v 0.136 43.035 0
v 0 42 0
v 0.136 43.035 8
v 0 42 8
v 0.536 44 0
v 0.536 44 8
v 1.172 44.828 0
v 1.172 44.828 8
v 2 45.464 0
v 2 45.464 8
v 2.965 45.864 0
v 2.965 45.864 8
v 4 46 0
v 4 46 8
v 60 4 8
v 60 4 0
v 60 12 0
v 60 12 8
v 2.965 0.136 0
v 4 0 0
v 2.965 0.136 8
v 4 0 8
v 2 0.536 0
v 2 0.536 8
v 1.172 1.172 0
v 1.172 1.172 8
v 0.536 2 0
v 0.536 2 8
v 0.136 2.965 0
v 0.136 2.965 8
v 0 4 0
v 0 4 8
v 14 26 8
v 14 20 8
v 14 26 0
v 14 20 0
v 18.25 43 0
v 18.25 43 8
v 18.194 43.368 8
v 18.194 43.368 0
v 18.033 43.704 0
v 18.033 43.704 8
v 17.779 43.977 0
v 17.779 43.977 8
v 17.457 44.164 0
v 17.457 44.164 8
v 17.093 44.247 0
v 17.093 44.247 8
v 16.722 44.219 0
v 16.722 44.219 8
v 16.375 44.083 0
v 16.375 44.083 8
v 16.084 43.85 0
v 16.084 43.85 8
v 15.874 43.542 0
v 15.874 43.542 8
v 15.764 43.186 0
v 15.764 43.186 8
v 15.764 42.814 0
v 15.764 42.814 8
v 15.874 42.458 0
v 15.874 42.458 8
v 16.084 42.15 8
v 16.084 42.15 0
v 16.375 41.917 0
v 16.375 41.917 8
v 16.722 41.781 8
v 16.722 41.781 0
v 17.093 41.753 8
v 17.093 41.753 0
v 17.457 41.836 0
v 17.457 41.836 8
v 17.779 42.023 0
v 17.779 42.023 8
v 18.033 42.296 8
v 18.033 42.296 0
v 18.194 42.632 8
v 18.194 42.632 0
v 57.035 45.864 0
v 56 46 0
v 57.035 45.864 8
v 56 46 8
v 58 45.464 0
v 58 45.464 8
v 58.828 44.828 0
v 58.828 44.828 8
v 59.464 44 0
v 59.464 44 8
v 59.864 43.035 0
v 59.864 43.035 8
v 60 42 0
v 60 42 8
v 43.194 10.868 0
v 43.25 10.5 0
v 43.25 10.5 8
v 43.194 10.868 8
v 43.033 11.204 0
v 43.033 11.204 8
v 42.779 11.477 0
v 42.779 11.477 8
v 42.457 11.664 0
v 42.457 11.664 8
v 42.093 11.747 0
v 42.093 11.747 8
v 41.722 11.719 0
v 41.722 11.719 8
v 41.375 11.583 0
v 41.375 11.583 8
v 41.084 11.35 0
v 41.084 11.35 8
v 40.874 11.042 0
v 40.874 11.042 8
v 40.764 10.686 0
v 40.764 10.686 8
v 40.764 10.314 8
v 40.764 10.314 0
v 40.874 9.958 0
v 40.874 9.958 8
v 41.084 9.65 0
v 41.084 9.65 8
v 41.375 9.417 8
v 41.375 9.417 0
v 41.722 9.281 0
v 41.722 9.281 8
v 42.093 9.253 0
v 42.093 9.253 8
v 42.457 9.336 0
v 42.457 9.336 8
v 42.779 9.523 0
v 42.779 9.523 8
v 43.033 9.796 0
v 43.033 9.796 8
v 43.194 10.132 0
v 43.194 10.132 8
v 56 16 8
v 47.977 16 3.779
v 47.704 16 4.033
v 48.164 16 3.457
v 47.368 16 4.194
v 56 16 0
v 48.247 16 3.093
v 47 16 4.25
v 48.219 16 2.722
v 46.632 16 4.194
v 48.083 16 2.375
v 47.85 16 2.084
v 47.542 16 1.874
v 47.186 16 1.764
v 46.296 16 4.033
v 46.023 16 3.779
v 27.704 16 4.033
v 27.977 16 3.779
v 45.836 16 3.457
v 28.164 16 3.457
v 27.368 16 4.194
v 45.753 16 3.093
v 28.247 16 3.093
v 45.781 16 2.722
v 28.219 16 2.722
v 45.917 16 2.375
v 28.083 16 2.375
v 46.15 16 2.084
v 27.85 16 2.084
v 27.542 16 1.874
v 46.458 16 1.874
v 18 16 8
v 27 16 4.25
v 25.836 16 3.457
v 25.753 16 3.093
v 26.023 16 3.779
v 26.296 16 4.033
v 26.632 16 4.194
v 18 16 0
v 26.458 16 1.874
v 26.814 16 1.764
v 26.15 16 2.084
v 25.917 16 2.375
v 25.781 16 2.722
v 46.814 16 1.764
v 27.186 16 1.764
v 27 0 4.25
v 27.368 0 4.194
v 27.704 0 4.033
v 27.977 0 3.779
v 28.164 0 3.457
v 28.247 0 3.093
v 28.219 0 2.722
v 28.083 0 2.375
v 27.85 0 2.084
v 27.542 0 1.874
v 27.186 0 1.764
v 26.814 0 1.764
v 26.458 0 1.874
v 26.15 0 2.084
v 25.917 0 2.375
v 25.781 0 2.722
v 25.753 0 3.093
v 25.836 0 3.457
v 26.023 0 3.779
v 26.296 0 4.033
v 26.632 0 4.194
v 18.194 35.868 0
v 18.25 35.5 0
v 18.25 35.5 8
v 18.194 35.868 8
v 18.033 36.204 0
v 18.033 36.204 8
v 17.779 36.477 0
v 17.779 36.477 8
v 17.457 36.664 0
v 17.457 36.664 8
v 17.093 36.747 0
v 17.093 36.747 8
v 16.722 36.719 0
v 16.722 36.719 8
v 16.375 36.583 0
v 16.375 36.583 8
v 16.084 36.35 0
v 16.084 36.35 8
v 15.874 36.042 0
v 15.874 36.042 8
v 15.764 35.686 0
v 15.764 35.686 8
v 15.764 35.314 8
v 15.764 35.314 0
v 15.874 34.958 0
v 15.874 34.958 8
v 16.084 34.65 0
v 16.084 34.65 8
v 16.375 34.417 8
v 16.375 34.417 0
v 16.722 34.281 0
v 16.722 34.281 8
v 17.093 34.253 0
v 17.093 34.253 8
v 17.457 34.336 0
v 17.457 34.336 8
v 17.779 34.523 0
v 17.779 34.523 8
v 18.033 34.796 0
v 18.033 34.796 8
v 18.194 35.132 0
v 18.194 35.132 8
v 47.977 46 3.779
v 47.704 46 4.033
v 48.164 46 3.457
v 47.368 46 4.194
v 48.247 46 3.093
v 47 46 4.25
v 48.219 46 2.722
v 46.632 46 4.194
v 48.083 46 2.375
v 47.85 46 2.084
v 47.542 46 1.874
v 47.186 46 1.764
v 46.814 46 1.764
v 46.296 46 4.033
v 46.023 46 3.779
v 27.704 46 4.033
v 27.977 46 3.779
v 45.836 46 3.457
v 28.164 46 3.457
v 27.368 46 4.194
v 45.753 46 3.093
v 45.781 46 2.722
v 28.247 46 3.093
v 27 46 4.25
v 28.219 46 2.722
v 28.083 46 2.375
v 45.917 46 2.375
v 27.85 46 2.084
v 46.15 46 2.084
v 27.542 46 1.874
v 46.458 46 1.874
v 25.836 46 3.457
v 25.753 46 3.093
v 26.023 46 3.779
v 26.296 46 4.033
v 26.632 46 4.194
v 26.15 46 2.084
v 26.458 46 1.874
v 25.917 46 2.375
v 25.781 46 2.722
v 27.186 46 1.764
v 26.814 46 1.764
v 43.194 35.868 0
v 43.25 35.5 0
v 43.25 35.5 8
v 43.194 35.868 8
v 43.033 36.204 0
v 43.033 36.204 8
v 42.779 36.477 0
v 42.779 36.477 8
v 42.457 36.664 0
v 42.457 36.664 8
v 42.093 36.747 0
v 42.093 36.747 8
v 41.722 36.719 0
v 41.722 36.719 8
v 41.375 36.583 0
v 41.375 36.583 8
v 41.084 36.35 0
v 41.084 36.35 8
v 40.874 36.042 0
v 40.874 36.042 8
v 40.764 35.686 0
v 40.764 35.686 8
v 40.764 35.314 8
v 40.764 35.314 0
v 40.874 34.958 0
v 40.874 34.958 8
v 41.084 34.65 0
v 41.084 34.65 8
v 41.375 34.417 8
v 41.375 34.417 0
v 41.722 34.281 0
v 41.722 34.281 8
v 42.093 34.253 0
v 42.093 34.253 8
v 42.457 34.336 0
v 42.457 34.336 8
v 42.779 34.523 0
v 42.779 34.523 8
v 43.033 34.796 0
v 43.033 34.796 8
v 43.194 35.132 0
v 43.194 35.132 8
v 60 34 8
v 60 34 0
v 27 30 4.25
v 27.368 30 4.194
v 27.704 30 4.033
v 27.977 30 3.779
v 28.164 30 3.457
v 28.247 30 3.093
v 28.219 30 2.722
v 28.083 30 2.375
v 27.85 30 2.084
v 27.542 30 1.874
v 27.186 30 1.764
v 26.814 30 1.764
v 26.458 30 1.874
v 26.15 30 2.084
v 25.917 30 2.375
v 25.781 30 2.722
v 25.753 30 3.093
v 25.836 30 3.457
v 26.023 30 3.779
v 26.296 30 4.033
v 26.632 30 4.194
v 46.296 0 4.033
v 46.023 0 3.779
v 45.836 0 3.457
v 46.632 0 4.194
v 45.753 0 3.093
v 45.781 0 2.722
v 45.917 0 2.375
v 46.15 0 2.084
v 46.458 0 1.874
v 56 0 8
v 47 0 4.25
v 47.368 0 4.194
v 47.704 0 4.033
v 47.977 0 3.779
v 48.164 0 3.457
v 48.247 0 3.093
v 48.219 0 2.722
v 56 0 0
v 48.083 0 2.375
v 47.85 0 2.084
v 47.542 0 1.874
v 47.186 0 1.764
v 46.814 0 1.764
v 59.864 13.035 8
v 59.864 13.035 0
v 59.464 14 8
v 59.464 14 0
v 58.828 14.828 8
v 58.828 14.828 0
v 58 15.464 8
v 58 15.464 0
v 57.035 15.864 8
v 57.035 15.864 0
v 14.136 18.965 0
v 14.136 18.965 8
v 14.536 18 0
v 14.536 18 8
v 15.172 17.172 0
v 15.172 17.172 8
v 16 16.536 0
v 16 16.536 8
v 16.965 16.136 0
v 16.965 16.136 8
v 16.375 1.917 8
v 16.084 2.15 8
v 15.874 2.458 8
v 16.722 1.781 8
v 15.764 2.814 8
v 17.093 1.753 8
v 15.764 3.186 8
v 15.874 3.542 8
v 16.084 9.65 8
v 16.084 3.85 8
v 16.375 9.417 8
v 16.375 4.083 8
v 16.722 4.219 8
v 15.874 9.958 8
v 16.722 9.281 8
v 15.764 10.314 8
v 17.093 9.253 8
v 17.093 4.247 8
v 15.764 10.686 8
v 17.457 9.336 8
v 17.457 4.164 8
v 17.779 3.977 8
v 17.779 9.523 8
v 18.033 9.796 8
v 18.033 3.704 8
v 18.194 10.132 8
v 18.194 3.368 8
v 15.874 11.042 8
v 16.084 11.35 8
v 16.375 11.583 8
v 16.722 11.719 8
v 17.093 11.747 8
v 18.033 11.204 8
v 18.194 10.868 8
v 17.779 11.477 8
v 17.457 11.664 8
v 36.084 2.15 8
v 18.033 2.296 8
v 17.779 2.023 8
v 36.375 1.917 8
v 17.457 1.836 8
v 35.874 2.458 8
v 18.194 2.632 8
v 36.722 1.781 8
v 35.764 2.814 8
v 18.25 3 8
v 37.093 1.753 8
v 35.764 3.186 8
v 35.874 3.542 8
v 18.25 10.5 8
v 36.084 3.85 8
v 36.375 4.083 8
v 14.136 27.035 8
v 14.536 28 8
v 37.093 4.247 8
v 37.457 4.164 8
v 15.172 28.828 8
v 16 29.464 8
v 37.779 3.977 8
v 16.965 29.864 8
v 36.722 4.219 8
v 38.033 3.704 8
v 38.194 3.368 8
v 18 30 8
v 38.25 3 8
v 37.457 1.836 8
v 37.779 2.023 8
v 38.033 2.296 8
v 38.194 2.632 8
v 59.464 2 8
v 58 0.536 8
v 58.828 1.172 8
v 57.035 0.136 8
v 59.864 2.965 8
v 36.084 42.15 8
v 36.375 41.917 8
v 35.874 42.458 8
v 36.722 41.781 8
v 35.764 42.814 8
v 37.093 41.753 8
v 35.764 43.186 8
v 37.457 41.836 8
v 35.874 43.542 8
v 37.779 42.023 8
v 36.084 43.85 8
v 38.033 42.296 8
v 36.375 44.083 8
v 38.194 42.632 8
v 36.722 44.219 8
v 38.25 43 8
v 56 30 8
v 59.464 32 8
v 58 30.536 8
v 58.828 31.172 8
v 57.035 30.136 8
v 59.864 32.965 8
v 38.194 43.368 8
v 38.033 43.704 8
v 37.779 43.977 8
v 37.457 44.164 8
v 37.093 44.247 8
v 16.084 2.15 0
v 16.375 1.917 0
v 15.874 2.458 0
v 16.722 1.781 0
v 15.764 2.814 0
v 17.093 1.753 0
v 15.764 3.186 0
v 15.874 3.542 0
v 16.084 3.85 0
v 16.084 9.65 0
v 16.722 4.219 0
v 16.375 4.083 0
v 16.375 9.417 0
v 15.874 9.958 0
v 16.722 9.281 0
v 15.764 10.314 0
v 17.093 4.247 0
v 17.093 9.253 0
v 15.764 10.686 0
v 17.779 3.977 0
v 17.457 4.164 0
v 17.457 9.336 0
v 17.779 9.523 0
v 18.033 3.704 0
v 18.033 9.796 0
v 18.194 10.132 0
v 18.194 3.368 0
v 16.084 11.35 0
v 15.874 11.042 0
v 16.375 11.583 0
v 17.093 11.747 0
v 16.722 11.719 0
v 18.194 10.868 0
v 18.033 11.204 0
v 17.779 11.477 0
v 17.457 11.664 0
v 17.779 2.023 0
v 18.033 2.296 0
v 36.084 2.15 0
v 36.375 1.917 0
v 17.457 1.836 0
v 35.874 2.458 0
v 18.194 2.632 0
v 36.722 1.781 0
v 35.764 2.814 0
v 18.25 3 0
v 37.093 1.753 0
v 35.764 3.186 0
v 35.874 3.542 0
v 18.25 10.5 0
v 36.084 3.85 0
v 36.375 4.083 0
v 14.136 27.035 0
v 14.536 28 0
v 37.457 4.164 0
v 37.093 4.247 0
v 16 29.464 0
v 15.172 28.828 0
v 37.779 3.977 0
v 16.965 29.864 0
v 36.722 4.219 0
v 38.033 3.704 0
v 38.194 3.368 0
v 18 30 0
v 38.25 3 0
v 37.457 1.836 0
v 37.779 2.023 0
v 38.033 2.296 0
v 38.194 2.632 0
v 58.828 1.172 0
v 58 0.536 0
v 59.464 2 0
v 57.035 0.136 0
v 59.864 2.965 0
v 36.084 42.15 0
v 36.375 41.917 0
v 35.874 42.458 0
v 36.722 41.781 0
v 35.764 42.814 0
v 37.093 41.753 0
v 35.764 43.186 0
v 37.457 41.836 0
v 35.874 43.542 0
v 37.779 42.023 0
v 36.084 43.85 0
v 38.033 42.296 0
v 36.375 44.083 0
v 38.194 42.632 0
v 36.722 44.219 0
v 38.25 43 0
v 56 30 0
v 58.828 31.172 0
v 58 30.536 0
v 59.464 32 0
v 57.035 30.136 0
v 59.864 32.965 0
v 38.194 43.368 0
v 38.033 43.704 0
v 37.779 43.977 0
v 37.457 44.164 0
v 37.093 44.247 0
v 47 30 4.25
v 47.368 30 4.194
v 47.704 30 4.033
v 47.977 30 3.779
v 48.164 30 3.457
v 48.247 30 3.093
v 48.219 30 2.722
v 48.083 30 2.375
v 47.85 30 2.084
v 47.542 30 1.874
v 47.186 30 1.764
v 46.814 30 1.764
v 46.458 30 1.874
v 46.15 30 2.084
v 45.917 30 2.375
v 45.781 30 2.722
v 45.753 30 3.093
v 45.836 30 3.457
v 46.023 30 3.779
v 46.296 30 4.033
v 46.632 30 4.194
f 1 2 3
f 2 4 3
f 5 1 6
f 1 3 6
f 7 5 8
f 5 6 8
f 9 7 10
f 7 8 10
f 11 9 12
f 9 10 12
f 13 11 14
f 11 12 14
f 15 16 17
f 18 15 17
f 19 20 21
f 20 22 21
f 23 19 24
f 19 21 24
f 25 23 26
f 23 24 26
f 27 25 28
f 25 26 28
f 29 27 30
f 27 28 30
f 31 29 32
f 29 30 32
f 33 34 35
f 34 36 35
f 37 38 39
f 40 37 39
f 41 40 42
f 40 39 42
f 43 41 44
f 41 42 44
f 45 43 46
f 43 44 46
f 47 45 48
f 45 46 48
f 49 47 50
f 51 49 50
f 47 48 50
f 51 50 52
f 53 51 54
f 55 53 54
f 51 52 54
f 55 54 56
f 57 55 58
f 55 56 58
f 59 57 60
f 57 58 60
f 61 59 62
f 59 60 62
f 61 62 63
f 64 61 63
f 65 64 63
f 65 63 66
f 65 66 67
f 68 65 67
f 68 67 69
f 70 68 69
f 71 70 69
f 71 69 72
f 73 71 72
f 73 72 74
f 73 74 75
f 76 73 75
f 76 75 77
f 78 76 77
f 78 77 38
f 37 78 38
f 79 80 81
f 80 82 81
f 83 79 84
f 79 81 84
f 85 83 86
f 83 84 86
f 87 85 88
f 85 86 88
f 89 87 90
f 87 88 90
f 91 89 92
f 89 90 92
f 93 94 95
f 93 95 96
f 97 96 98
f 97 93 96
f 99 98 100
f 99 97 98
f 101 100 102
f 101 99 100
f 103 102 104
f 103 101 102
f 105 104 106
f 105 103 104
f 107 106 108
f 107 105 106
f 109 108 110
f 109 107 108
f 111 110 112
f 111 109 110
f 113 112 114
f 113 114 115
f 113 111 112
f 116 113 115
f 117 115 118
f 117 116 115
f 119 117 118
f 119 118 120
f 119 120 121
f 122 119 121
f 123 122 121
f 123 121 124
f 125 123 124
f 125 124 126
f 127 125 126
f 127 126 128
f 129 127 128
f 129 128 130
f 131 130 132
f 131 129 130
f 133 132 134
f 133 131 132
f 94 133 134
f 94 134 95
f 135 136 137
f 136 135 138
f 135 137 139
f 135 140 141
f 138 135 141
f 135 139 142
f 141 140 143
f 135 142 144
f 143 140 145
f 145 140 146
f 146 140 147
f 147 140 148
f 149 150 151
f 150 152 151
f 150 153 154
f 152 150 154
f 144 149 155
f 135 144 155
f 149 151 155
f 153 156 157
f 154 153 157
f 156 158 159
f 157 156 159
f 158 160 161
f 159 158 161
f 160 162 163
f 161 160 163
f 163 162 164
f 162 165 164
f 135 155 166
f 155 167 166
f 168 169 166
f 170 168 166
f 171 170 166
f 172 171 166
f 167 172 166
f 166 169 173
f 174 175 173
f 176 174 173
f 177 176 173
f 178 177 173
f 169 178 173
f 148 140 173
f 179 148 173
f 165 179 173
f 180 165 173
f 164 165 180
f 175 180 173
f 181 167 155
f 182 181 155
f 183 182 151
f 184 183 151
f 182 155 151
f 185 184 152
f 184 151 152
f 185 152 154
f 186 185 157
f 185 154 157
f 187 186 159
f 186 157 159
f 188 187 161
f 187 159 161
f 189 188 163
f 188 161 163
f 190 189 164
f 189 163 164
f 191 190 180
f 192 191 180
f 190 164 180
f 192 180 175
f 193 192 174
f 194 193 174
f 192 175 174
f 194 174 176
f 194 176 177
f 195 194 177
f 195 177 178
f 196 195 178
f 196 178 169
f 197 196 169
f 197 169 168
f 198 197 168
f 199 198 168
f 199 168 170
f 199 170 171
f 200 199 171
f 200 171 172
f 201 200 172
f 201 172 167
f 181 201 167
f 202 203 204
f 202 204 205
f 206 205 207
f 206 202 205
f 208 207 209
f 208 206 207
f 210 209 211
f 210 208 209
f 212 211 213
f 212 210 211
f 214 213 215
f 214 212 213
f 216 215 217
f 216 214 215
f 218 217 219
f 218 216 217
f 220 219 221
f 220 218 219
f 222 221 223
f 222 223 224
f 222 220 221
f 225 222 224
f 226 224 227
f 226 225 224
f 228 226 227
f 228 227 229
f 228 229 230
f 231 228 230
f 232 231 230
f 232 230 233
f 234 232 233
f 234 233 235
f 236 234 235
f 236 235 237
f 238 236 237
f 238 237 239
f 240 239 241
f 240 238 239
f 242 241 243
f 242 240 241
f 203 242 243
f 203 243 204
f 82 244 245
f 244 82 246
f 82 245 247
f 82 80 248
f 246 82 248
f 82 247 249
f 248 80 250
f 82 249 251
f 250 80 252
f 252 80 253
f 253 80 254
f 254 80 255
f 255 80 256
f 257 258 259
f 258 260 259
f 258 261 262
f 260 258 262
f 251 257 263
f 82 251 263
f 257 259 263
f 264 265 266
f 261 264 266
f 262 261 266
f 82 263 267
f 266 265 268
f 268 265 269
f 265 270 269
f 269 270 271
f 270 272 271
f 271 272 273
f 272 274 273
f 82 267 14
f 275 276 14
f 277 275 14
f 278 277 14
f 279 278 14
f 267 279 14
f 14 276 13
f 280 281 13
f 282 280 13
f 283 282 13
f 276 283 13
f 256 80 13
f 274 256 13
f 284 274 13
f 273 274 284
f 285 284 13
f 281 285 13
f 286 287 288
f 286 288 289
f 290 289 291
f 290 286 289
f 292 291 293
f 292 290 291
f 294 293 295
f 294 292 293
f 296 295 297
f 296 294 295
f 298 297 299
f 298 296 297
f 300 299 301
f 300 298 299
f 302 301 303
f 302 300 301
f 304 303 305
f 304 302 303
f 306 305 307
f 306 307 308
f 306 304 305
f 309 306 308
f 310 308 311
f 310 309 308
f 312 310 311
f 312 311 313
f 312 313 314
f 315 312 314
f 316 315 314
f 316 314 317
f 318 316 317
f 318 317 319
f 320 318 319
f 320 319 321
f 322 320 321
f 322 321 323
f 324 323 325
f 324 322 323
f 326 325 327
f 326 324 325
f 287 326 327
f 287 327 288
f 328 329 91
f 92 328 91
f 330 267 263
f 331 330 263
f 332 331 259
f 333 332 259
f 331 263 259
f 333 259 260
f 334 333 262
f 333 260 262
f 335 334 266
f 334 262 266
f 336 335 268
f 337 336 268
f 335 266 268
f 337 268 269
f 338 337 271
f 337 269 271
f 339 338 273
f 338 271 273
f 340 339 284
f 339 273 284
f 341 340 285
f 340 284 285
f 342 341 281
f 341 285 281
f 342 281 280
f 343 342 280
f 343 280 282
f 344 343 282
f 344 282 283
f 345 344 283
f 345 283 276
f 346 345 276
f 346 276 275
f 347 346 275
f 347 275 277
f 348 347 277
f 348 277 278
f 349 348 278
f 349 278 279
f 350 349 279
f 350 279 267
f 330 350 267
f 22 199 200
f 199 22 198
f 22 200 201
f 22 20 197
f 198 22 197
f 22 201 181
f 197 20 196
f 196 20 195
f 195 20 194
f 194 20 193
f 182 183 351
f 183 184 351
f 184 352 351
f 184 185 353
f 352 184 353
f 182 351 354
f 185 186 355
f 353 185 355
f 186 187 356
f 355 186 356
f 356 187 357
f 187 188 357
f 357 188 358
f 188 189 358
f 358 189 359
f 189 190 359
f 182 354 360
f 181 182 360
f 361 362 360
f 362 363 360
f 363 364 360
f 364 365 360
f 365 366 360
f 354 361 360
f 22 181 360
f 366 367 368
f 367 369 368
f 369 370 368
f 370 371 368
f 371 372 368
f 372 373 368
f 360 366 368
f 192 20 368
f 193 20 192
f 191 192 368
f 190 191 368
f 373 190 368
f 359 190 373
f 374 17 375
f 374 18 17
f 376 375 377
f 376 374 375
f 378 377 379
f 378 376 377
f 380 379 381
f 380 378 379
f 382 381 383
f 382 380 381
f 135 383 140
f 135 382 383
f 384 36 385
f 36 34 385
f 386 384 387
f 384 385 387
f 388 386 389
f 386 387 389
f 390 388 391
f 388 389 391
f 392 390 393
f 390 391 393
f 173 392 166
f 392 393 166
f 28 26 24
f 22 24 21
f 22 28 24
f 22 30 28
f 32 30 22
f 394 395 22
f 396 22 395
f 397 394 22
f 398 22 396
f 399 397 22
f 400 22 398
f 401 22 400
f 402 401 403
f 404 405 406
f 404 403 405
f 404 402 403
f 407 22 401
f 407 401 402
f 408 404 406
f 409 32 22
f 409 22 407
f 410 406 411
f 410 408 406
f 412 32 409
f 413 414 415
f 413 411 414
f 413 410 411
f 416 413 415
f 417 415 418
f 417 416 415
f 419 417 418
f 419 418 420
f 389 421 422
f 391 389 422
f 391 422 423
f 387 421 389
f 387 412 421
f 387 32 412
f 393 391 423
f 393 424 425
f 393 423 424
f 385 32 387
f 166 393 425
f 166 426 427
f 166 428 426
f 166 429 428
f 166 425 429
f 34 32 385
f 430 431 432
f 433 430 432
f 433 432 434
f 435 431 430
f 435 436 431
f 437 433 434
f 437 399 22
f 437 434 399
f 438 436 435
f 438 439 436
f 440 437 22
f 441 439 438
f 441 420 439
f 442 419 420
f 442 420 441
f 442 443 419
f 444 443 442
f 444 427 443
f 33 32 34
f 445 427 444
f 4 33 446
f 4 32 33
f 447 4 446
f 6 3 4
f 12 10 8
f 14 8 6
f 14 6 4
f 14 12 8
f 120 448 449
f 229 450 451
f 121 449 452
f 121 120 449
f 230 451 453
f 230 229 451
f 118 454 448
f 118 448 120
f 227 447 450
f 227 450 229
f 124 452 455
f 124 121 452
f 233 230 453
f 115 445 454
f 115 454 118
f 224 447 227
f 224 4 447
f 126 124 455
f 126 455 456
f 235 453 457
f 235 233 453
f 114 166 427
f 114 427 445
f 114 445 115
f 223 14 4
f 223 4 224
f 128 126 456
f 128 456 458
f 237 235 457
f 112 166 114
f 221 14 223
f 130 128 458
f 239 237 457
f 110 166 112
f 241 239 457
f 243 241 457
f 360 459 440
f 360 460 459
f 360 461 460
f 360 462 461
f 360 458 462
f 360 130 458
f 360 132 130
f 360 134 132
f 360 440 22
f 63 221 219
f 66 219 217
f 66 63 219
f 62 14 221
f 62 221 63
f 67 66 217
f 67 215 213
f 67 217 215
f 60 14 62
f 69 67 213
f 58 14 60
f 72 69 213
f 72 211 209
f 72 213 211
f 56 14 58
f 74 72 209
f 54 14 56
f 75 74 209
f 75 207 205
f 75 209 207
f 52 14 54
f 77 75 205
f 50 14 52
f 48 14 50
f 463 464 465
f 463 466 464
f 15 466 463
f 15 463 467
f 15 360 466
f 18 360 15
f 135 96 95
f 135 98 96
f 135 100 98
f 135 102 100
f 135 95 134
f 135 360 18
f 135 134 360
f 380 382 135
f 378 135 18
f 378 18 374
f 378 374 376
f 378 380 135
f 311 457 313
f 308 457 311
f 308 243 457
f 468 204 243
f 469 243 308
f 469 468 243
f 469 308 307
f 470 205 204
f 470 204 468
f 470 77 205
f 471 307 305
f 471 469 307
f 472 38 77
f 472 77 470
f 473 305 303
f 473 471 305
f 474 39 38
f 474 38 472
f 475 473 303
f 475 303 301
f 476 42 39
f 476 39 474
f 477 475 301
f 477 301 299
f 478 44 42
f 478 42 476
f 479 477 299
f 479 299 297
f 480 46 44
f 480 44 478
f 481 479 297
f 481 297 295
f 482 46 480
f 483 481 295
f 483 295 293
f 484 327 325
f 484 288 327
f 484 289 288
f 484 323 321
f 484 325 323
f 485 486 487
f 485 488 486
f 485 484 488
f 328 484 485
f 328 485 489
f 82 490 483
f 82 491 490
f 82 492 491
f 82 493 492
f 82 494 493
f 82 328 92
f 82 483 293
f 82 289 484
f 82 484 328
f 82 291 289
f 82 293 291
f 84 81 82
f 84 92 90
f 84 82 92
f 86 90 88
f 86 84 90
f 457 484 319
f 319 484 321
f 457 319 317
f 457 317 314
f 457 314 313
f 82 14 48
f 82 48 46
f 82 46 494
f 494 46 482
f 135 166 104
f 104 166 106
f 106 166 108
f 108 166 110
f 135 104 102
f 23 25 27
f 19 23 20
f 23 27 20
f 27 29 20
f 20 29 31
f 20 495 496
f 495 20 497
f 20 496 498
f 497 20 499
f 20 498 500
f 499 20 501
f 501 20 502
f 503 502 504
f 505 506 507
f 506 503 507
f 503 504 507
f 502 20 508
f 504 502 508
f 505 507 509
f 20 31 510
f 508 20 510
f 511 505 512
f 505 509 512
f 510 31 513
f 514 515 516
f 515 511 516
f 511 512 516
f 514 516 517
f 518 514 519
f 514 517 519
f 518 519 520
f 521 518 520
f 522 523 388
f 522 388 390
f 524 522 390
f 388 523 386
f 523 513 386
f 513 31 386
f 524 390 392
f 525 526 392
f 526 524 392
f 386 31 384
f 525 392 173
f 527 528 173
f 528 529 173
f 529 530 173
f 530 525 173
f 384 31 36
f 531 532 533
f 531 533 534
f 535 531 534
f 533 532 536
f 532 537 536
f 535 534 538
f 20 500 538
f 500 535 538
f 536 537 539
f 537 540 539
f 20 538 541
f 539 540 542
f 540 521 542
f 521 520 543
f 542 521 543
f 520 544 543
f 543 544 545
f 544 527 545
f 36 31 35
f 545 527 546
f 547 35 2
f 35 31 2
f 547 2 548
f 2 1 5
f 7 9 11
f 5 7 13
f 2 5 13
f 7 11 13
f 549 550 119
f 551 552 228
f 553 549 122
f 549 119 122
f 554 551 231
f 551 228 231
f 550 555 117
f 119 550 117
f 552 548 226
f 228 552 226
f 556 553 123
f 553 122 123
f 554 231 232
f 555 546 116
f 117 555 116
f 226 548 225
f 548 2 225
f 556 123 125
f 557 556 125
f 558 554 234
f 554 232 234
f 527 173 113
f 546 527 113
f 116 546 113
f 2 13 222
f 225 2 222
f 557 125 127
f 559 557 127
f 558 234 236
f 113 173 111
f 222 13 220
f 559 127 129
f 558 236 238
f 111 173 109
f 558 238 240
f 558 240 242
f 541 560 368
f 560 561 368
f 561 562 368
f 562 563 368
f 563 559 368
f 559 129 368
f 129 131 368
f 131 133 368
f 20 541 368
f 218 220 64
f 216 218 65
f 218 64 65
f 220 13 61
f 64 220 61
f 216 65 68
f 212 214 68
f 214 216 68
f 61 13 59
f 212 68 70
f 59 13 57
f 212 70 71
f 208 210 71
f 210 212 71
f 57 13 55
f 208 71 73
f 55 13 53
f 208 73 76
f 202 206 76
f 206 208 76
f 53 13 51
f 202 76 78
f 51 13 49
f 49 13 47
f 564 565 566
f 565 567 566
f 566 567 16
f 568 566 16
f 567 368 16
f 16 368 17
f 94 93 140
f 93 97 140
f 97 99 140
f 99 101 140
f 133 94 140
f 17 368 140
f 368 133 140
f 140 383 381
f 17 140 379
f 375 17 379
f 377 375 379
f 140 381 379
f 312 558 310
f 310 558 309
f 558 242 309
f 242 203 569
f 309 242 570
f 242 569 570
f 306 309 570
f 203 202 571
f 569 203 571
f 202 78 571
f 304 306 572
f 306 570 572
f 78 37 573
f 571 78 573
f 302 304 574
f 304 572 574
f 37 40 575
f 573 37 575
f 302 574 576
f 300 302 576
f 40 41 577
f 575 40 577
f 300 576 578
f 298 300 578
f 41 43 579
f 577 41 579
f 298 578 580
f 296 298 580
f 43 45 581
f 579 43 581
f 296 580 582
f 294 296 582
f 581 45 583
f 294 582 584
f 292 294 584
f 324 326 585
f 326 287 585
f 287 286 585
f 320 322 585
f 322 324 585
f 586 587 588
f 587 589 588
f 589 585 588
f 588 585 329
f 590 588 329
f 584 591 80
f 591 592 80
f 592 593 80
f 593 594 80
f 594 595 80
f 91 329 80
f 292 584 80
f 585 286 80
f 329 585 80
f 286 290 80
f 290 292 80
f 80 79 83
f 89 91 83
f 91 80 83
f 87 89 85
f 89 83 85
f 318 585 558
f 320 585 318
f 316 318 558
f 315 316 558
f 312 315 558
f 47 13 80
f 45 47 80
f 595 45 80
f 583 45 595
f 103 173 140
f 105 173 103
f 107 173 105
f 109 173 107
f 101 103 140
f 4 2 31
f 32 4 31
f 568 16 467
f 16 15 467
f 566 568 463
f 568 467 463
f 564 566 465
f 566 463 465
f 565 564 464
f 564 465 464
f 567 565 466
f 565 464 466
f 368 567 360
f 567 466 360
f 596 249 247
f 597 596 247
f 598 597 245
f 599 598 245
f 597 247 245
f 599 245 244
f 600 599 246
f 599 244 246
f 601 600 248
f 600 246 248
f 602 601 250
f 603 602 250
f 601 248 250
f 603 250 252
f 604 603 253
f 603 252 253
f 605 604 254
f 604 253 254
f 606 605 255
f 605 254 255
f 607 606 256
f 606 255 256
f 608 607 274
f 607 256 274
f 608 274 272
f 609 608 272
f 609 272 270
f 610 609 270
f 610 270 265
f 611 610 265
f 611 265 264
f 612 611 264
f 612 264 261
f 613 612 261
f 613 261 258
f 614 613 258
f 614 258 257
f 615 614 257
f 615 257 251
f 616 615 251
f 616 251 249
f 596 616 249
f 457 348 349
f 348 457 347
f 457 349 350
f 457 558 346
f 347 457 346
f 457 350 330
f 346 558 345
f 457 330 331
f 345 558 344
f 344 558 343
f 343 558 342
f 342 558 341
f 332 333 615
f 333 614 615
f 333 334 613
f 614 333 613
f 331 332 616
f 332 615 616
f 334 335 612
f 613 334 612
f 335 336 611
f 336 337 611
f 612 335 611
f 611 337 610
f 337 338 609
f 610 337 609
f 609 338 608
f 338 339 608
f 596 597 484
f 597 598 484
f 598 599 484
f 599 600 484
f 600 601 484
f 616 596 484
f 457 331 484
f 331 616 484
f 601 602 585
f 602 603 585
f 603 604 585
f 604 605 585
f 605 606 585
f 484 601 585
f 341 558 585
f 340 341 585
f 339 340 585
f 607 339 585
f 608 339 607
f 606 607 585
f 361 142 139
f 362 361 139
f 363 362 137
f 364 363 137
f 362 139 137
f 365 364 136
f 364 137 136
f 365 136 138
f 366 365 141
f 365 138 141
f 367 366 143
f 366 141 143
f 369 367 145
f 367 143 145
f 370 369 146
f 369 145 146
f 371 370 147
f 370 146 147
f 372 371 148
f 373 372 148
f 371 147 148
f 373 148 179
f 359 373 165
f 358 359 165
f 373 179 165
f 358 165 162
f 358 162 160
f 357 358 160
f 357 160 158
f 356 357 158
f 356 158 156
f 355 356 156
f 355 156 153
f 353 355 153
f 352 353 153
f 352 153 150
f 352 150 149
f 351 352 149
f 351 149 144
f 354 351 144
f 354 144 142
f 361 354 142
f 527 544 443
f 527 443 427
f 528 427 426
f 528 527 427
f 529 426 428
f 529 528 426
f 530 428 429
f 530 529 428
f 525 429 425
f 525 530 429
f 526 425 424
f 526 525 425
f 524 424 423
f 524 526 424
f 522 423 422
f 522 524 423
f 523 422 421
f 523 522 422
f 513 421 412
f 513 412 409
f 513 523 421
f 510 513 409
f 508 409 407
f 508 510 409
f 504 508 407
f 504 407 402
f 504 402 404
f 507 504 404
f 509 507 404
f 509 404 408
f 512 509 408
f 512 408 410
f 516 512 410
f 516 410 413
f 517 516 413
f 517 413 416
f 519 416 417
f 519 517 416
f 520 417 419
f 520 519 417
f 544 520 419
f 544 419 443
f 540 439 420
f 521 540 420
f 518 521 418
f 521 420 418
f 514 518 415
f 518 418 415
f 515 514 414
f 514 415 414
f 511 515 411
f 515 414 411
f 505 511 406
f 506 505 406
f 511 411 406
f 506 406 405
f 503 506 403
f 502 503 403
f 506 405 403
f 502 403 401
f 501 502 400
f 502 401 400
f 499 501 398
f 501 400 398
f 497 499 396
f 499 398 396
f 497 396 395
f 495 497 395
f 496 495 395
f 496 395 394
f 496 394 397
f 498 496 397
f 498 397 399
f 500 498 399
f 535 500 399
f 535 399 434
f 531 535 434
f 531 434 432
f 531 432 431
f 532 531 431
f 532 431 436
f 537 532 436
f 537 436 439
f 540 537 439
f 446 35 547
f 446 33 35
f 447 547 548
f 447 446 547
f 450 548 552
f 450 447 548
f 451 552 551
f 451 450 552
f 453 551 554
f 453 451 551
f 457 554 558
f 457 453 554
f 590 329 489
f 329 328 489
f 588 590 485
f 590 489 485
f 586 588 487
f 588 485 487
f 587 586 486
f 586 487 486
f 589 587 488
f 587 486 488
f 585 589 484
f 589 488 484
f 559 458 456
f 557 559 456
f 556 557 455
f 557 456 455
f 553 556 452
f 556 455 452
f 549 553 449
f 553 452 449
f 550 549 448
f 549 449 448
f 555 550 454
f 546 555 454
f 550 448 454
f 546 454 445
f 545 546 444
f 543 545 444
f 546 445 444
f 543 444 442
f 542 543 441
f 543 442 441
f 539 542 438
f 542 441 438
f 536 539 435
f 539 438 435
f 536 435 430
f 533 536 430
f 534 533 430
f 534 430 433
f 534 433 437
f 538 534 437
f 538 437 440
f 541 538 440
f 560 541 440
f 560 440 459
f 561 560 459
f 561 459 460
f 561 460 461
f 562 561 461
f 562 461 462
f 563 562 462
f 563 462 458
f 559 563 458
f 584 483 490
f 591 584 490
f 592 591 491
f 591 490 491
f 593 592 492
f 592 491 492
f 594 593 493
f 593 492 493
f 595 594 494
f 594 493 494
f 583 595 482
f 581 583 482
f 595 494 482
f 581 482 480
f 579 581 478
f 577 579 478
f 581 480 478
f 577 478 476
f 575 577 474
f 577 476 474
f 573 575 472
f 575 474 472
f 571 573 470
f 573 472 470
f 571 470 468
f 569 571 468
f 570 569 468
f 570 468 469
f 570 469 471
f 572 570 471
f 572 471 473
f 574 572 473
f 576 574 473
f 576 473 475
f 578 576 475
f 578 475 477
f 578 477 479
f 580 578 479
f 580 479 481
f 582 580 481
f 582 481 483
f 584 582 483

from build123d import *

# Parameters (mm, degrees)
SKETCH_1_R          = 1.25
EXTRUDE_1_DEPTH     = 8
FILLET_1_R          = 4
SKETCH_2_R          = 1.25
CUT_EXTRUDE_1_DEPTH = 10
SKETCH_3_R          = 1.25
CUT_EXTRUDE_2_DEPTH = 67


with BuildPart() as part:
    # 草图1 → 凸台-拉伸1 (new body)
    # profile 1 of 2: a face of its own
    with BuildSketch(Plane.XY):
        Polygon((0, 46), (0, 23), (14, 23), (14, 30), (60, 30), (60, 46), align=None)
        with Locations((17, 35.5)):
            Circle(SKETCH_1_R, mode=Mode.SUBTRACT)
        with Locations((42, 35.5)):
            Circle(SKETCH_1_R, mode=Mode.SUBTRACT)
    # profile 2 of 2: a face of its own
    with BuildSketch(Plane.XY):
        Polygon((14, 23), (0, 23), (0, 0), (60, 0), (60, 16), (14, 16), align=None)
        with Locations((17, 10.5)):
            Circle(SKETCH_1_R, mode=Mode.SUBTRACT)
        with Locations((42, 10.5)):
            Circle(SKETCH_1_R, mode=Mode.SUBTRACT)
    extrude(amount=EXTRUDE_1_DEPTH)

    # 圆角1
    fillet_1_edges = [part.edges().sort_by_distance(p)[0] for p in [
        (0, 46, 4),
        (60, 46, 4),
        (60, 30, 4),
        (14, 30, 4),
        (14, 16, 4),
        (60, 16, 4),
        (60, 0, 4),
        (0, 0, 4),
    ]]
    fillet(fillet_1_edges, radius=FILLET_1_R)

    # 草图2 → 切除-拉伸1 (cut)
    with BuildSketch(Plane.XY.offset(8)):
        with Locations((17, 3)):
            Circle(SKETCH_2_R)
        with Locations((37, 3)):
            Circle(SKETCH_2_R)
        with Locations((37, 43)):
            Circle(SKETCH_2_R)
        with Locations((17, 43)):
            Circle(SKETCH_2_R)
    extrude(amount=-CUT_EXTRUDE_1_DEPTH, mode=Mode.SUBTRACT)

    # 草图3 → 切除-拉伸2 (cut)
    with BuildSketch(Plane(origin=(0, 46, 0), x_dir=(1, 0, 0), z_dir=(0, 1, 0))):
        with Locations(Location((27, -3, 0), (0, 0, 270))):
            Circle(SKETCH_3_R)
        with Locations(Location((47, -3, 0), (0, 0, 270))):
            Circle(SKETCH_3_R)
    extrude(amount=-CUT_EXTRUDE_2_DEPTH, mode=Mode.SUBTRACT)


solid = part.part
